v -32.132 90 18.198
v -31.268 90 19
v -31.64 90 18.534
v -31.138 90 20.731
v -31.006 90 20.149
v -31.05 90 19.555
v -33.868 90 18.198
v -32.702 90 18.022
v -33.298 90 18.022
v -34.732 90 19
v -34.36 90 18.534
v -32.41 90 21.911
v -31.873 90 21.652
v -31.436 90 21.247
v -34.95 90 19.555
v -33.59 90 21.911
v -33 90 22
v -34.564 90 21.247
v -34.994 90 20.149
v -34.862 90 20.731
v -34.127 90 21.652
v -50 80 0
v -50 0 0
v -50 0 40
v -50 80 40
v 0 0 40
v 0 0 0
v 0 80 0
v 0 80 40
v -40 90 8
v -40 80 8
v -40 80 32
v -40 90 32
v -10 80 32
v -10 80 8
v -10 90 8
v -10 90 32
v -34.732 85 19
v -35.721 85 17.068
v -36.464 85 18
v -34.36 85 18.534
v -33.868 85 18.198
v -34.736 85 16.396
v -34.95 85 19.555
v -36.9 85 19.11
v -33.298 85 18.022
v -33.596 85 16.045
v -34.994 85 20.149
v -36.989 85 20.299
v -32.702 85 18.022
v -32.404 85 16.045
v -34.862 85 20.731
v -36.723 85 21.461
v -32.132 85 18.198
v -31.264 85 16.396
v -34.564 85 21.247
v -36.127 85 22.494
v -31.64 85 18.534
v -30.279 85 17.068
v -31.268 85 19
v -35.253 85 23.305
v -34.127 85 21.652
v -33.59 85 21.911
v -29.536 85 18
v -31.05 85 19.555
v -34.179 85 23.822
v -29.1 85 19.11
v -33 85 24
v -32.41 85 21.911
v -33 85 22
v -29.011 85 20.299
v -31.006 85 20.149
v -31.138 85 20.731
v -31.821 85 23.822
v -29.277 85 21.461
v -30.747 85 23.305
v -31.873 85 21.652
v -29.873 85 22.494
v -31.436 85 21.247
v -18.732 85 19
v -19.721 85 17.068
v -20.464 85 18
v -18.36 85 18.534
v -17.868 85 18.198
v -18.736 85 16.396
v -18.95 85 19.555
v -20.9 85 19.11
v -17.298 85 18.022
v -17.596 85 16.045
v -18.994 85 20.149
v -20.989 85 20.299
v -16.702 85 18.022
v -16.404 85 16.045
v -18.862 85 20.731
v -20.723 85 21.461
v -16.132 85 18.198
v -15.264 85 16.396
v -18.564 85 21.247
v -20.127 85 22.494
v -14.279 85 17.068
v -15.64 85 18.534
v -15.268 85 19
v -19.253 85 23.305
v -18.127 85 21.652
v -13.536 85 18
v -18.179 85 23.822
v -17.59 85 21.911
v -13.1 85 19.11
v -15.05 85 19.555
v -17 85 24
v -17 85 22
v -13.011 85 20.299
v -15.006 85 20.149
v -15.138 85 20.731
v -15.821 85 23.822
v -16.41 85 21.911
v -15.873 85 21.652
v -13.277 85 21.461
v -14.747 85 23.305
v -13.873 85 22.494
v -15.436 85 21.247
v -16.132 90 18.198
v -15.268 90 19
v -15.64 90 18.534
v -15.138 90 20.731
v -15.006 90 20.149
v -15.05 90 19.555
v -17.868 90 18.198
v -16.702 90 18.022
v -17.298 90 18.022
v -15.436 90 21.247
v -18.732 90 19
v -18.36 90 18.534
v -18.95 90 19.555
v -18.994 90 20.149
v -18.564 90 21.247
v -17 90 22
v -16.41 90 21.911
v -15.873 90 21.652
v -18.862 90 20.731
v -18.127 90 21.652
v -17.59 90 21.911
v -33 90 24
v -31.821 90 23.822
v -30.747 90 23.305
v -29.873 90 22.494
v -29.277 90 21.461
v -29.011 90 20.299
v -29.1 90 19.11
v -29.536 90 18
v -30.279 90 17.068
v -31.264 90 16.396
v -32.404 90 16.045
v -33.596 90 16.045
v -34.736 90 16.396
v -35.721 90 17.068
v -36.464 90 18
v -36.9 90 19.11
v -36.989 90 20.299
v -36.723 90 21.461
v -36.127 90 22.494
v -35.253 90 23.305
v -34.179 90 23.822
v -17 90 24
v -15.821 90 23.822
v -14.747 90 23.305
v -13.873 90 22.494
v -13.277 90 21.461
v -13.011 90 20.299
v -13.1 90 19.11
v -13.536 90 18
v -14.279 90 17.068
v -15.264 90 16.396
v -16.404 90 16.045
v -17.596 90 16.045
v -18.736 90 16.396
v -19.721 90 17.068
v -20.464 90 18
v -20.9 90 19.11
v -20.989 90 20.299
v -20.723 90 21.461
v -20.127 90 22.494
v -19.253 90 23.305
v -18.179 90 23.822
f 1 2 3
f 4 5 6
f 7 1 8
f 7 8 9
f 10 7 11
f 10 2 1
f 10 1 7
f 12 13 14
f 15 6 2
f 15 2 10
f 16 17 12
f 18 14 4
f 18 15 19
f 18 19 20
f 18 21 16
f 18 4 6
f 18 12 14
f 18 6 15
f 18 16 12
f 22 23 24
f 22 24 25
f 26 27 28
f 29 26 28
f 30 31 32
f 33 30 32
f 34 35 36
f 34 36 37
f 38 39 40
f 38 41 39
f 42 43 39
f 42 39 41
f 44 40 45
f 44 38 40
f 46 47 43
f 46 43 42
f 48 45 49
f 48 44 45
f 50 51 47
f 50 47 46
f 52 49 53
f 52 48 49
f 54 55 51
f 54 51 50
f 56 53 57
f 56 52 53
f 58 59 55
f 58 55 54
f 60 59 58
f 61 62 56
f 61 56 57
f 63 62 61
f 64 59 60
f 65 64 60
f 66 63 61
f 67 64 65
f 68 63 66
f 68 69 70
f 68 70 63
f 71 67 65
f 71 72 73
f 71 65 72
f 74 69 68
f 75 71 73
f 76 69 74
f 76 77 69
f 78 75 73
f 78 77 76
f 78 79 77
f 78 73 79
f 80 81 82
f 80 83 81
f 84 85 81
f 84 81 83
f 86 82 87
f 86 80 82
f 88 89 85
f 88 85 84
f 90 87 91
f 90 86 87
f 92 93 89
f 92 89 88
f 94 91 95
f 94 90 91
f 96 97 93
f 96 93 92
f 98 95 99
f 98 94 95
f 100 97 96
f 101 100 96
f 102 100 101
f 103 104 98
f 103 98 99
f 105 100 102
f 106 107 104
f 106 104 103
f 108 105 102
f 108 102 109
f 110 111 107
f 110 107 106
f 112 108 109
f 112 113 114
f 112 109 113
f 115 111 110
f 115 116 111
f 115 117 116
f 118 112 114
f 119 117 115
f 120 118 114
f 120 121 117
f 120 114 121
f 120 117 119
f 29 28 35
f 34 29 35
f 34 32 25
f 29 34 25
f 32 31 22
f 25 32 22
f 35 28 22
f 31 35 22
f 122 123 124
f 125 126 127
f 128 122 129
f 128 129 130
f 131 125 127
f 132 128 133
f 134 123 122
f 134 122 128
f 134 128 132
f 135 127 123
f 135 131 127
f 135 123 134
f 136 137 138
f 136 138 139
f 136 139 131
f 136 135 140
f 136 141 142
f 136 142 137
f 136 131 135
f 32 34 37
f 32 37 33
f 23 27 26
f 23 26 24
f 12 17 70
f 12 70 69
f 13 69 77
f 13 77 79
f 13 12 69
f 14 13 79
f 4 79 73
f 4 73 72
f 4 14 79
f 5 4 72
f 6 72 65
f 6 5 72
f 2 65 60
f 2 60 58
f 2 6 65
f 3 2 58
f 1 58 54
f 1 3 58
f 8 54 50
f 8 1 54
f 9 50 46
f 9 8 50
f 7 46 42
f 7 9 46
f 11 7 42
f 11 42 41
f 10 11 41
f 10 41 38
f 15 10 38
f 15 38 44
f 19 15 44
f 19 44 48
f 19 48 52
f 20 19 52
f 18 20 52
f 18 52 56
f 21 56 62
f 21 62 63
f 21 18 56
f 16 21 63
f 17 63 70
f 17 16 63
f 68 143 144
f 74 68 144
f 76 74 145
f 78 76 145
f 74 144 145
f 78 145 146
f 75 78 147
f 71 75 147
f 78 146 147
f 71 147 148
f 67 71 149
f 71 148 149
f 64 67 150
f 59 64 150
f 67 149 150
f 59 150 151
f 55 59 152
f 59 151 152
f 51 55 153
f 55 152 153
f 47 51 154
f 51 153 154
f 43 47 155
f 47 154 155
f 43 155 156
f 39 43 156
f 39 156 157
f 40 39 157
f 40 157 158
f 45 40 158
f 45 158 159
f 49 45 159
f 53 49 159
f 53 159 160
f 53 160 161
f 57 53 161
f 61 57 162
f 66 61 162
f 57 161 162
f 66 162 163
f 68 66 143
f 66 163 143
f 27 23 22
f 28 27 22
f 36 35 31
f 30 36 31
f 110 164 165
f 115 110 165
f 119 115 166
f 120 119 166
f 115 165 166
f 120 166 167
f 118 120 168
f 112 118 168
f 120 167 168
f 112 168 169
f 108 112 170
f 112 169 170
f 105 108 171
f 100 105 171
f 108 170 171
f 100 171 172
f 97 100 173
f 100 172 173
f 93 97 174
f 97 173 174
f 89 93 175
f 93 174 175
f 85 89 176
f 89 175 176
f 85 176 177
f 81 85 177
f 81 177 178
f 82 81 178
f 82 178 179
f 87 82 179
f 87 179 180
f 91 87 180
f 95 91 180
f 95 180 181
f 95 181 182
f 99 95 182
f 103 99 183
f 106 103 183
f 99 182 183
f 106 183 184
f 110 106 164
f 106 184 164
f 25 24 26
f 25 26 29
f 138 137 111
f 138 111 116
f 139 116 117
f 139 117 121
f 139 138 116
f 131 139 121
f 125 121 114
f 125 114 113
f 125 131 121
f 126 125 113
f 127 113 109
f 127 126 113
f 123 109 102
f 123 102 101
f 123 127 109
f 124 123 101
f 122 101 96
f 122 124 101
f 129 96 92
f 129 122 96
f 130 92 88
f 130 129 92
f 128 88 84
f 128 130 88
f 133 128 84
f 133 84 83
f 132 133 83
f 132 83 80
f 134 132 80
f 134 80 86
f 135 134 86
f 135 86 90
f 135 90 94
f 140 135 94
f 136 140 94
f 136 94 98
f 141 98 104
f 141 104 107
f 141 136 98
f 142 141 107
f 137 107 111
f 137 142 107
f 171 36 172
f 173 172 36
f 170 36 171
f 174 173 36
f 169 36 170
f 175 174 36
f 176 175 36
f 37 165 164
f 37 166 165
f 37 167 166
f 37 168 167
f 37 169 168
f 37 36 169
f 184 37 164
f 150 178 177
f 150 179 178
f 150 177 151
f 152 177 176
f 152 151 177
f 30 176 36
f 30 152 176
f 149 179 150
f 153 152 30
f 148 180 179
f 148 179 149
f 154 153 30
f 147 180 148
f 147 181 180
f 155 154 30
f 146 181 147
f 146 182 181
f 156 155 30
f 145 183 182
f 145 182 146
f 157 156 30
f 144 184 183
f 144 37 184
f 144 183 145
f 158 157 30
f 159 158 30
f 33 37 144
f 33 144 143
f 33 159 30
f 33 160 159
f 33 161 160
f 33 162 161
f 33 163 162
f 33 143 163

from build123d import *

# Parameters (mm, degrees)
SKETCH1_W           = 80
SKETCH1_H           = 50
BOSS_EXTRUDE1_DEPTH = 40
SKETCH2_W           = 30
SKETCH2_H           = 24
BOSS_EXTRUDE2_DEPTH = 10
SKETCH3_R           = 4
SKETCH3_R_2         = 2
CUT_EXTRUDE1_DEPTH  = 5


with BuildPart() as part:
    # Sketch1 → Boss-Extrude1 (new body)
    with BuildSketch(Plane(origin=(0, 0, 0), x_dir=(0, 1, 0), z_dir=(0, 0, 1))):
        with Locations((40, 25)):
            Rectangle(SKETCH1_W, SKETCH1_H)
    extrude(amount=BOSS_EXTRUDE1_DEPTH)

    # Sketch2 → Boss-Extrude2 (add)
    with BuildSketch(Plane(origin=(0, 80, 0), x_dir=(-1, 0, 0), z_dir=(0, 1, 0))):
        with Locations((25, 20)):
            Rectangle(SKETCH2_W, SKETCH2_H)
    extrude(amount=BOSS_EXTRUDE2_DEPTH)

    # Sketch3 → Cut-Extrude1 (cut)
    # profile 1 of 2: a face of its own
    with BuildSketch(Plane(origin=(0, 90, 0), x_dir=(-1, 0, 0), z_dir=(0, 1, 0))):
        with Locations(Location((17, 20, 0), (0, 0, 90))):
            Circle(SKETCH3_R)
        with Locations(Location((17, 20, 0), (0, 0, 90))):
            Circle(SKETCH3_R_2, mode=Mode.SUBTRACT)
    # profile 2 of 2: a face of its own
    with BuildSketch(Plane(origin=(0, 90, 0), x_dir=(-1, 0, 0), z_dir=(0, 1, 0))):
        with Locations(Location((33, 20, 0), (0, 0, 90))):
            Circle(SKETCH3_R)
        with Locations(Location((33, 20, 0), (0, 0, 90))):
            Circle(SKETCH3_R_2, mode=Mode.SUBTRACT)
    extrude(amount=-CUT_EXTRUDE1_DEPTH, mode=Mode.SUBTRACT)


solid = part.part
